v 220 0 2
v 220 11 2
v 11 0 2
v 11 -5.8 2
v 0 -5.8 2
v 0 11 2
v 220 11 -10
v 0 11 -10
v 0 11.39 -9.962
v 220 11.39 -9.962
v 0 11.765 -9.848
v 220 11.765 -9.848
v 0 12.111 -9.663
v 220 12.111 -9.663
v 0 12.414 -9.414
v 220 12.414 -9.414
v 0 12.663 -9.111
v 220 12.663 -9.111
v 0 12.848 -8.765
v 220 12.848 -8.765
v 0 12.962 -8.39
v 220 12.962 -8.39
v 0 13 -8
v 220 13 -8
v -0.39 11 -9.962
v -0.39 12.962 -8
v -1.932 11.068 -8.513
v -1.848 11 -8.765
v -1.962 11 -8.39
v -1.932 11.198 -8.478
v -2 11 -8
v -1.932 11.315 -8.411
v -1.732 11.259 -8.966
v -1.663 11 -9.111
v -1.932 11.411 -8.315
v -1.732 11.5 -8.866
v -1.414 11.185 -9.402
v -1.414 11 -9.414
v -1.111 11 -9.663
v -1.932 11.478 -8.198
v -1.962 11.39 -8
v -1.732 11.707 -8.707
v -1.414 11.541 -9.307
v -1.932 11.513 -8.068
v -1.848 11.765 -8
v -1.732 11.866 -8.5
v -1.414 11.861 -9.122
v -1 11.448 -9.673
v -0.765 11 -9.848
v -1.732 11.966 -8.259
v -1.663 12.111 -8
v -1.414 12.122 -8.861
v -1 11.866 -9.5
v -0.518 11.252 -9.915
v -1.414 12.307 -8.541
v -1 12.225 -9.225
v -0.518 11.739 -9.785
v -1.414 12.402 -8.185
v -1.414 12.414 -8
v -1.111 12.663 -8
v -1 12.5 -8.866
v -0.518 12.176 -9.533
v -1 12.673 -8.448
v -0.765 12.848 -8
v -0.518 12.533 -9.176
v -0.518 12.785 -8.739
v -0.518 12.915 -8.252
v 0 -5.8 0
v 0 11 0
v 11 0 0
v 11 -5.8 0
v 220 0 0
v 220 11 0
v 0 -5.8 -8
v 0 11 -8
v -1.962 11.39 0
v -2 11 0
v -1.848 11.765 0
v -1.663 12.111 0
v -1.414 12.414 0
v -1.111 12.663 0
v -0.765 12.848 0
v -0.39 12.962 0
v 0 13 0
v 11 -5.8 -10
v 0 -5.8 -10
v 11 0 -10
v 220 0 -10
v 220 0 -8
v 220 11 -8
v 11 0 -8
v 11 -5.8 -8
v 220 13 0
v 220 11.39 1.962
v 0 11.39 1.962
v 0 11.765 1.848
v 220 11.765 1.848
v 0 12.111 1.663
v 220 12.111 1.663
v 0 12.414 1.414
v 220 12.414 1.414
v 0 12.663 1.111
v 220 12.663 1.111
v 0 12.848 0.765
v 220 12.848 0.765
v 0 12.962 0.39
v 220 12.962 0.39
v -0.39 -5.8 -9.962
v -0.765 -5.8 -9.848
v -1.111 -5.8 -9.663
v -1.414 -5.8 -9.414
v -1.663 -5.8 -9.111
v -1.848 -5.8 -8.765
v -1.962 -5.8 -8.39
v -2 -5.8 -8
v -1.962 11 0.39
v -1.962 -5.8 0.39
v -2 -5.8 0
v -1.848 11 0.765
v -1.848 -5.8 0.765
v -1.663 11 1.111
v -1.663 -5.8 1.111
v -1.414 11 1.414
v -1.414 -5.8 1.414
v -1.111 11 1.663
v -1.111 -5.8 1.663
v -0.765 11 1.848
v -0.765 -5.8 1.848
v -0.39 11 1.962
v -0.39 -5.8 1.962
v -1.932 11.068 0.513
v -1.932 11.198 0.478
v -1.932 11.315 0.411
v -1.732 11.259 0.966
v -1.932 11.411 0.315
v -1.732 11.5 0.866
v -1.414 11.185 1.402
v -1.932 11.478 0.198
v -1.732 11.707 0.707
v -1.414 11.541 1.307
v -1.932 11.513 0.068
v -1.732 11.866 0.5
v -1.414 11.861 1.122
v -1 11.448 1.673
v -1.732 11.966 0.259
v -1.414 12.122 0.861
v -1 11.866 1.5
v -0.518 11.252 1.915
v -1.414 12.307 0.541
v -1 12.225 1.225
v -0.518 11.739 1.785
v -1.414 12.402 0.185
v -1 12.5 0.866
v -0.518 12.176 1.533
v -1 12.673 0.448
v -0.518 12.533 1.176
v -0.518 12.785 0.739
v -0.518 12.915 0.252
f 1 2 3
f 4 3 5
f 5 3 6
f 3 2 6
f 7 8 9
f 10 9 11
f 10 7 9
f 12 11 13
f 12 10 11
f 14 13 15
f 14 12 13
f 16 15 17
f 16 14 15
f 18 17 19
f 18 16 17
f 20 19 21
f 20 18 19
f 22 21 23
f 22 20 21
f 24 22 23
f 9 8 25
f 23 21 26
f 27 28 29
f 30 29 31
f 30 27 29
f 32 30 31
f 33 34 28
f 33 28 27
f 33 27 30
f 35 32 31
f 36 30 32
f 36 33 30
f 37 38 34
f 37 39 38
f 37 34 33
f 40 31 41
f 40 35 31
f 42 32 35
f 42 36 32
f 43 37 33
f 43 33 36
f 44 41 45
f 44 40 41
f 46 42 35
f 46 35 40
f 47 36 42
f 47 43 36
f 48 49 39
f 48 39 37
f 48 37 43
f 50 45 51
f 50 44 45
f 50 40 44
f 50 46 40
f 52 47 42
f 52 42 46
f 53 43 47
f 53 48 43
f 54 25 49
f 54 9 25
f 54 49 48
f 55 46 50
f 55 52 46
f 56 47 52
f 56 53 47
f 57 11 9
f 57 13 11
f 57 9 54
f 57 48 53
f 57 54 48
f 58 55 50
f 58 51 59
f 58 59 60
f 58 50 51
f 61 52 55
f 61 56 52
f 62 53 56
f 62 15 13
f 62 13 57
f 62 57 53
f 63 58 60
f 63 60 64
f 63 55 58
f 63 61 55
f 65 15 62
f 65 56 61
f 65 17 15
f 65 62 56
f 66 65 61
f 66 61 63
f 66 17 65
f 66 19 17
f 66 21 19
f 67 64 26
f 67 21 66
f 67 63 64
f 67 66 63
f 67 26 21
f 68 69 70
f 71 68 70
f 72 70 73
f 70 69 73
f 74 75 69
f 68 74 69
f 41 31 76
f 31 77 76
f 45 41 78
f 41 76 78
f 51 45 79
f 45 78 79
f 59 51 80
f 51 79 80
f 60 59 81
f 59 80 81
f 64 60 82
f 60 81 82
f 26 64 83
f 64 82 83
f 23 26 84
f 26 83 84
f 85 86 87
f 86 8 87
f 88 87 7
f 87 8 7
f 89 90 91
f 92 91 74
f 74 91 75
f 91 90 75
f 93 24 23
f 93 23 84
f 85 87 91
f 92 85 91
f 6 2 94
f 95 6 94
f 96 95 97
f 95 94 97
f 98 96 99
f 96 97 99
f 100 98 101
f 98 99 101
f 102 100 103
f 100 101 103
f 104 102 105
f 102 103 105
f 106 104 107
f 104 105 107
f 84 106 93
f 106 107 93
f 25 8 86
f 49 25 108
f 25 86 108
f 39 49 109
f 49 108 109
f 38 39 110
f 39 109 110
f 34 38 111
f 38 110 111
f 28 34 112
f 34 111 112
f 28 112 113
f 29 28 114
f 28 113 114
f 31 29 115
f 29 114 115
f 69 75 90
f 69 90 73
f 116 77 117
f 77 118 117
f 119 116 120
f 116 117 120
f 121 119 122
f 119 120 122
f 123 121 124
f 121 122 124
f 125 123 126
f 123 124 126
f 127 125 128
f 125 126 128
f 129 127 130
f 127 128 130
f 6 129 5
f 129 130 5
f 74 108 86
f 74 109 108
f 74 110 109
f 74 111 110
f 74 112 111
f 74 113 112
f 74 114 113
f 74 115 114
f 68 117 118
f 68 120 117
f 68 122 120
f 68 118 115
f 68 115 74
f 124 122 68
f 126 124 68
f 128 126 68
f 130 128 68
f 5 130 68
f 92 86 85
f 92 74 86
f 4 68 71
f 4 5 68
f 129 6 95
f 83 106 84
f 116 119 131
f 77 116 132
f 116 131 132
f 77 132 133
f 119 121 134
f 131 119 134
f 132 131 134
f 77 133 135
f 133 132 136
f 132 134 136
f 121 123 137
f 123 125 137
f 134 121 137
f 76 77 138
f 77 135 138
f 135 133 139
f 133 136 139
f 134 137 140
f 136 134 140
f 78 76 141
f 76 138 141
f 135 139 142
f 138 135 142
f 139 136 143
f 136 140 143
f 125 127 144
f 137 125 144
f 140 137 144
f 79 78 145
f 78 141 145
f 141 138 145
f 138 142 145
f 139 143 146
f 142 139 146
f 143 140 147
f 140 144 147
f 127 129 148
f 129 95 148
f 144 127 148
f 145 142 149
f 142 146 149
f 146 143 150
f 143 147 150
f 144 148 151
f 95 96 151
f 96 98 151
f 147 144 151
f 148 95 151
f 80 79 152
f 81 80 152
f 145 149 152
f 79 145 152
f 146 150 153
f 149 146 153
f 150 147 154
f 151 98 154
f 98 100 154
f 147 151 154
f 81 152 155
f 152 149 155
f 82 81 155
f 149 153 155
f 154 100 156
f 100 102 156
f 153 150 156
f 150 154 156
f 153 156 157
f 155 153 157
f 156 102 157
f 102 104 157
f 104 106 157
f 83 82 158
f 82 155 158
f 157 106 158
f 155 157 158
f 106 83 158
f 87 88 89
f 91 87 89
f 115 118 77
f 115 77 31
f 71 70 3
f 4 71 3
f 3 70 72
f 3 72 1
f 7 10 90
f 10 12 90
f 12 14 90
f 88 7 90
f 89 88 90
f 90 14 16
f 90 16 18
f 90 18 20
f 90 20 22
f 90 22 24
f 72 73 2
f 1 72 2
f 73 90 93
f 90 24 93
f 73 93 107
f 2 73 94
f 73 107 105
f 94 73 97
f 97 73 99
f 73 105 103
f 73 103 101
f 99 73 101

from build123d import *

# Parameters (mm, degrees)
BOSS_EXTRUDE1_DEPTH = 220
SKETCH2_W           = 12
SKETCH2_H           = 13
BOSS_EXTRUDE2_DEPTH = 2
BOSS_EXTRUDE3_DEPTH = 5.8
FILLET1_R           = 2


with BuildPart() as part:
    # Sketch1 → Boss-Extrude1 (new body)
    with BuildSketch(Plane(origin=(0, 0, 0), x_dir=(0, 0, -1), z_dir=(1, 0, 0))):
        Polygon((8, 0), (8, 11), (0, 11), (0, 0), (-2, 0), (-2, 13), (10, 13), (10, 0), align=None)
    extrude(amount=BOSS_EXTRUDE1_DEPTH)

    # Sketch2 → Boss-Extrude2 (add)
    with BuildSketch(Plane.ZY):
        with Locations((-4, 6.5)):
            Rectangle(SKETCH2_W, SKETCH2_H)
    extrude(amount=BOSS_EXTRUDE2_DEPTH)

    # Sketch4 → Boss-Extrude3 (add)
    with BuildSketch(Plane.XZ):
        Polygon((0, 0), (11, 0), (11, 2), (-2, 2), (-2, -10), (11, -10), (11, -8), (0, -8), align=None)
    extrude(amount=BOSS_EXTRUDE3_DEPTH)

    # Fillet1
    fillet1_edges = [part.edges().sort_by_distance(p)[0] for p in [
        (109, 13, 2),
        (109, 13, -10),
        (-2, 3.6, -10),
        (-2, 3.6, 2),
        (-2, 13, -4),
    ]]
    fillet(fillet1_edges, radius=FILLET1_R)


solid = part.part
